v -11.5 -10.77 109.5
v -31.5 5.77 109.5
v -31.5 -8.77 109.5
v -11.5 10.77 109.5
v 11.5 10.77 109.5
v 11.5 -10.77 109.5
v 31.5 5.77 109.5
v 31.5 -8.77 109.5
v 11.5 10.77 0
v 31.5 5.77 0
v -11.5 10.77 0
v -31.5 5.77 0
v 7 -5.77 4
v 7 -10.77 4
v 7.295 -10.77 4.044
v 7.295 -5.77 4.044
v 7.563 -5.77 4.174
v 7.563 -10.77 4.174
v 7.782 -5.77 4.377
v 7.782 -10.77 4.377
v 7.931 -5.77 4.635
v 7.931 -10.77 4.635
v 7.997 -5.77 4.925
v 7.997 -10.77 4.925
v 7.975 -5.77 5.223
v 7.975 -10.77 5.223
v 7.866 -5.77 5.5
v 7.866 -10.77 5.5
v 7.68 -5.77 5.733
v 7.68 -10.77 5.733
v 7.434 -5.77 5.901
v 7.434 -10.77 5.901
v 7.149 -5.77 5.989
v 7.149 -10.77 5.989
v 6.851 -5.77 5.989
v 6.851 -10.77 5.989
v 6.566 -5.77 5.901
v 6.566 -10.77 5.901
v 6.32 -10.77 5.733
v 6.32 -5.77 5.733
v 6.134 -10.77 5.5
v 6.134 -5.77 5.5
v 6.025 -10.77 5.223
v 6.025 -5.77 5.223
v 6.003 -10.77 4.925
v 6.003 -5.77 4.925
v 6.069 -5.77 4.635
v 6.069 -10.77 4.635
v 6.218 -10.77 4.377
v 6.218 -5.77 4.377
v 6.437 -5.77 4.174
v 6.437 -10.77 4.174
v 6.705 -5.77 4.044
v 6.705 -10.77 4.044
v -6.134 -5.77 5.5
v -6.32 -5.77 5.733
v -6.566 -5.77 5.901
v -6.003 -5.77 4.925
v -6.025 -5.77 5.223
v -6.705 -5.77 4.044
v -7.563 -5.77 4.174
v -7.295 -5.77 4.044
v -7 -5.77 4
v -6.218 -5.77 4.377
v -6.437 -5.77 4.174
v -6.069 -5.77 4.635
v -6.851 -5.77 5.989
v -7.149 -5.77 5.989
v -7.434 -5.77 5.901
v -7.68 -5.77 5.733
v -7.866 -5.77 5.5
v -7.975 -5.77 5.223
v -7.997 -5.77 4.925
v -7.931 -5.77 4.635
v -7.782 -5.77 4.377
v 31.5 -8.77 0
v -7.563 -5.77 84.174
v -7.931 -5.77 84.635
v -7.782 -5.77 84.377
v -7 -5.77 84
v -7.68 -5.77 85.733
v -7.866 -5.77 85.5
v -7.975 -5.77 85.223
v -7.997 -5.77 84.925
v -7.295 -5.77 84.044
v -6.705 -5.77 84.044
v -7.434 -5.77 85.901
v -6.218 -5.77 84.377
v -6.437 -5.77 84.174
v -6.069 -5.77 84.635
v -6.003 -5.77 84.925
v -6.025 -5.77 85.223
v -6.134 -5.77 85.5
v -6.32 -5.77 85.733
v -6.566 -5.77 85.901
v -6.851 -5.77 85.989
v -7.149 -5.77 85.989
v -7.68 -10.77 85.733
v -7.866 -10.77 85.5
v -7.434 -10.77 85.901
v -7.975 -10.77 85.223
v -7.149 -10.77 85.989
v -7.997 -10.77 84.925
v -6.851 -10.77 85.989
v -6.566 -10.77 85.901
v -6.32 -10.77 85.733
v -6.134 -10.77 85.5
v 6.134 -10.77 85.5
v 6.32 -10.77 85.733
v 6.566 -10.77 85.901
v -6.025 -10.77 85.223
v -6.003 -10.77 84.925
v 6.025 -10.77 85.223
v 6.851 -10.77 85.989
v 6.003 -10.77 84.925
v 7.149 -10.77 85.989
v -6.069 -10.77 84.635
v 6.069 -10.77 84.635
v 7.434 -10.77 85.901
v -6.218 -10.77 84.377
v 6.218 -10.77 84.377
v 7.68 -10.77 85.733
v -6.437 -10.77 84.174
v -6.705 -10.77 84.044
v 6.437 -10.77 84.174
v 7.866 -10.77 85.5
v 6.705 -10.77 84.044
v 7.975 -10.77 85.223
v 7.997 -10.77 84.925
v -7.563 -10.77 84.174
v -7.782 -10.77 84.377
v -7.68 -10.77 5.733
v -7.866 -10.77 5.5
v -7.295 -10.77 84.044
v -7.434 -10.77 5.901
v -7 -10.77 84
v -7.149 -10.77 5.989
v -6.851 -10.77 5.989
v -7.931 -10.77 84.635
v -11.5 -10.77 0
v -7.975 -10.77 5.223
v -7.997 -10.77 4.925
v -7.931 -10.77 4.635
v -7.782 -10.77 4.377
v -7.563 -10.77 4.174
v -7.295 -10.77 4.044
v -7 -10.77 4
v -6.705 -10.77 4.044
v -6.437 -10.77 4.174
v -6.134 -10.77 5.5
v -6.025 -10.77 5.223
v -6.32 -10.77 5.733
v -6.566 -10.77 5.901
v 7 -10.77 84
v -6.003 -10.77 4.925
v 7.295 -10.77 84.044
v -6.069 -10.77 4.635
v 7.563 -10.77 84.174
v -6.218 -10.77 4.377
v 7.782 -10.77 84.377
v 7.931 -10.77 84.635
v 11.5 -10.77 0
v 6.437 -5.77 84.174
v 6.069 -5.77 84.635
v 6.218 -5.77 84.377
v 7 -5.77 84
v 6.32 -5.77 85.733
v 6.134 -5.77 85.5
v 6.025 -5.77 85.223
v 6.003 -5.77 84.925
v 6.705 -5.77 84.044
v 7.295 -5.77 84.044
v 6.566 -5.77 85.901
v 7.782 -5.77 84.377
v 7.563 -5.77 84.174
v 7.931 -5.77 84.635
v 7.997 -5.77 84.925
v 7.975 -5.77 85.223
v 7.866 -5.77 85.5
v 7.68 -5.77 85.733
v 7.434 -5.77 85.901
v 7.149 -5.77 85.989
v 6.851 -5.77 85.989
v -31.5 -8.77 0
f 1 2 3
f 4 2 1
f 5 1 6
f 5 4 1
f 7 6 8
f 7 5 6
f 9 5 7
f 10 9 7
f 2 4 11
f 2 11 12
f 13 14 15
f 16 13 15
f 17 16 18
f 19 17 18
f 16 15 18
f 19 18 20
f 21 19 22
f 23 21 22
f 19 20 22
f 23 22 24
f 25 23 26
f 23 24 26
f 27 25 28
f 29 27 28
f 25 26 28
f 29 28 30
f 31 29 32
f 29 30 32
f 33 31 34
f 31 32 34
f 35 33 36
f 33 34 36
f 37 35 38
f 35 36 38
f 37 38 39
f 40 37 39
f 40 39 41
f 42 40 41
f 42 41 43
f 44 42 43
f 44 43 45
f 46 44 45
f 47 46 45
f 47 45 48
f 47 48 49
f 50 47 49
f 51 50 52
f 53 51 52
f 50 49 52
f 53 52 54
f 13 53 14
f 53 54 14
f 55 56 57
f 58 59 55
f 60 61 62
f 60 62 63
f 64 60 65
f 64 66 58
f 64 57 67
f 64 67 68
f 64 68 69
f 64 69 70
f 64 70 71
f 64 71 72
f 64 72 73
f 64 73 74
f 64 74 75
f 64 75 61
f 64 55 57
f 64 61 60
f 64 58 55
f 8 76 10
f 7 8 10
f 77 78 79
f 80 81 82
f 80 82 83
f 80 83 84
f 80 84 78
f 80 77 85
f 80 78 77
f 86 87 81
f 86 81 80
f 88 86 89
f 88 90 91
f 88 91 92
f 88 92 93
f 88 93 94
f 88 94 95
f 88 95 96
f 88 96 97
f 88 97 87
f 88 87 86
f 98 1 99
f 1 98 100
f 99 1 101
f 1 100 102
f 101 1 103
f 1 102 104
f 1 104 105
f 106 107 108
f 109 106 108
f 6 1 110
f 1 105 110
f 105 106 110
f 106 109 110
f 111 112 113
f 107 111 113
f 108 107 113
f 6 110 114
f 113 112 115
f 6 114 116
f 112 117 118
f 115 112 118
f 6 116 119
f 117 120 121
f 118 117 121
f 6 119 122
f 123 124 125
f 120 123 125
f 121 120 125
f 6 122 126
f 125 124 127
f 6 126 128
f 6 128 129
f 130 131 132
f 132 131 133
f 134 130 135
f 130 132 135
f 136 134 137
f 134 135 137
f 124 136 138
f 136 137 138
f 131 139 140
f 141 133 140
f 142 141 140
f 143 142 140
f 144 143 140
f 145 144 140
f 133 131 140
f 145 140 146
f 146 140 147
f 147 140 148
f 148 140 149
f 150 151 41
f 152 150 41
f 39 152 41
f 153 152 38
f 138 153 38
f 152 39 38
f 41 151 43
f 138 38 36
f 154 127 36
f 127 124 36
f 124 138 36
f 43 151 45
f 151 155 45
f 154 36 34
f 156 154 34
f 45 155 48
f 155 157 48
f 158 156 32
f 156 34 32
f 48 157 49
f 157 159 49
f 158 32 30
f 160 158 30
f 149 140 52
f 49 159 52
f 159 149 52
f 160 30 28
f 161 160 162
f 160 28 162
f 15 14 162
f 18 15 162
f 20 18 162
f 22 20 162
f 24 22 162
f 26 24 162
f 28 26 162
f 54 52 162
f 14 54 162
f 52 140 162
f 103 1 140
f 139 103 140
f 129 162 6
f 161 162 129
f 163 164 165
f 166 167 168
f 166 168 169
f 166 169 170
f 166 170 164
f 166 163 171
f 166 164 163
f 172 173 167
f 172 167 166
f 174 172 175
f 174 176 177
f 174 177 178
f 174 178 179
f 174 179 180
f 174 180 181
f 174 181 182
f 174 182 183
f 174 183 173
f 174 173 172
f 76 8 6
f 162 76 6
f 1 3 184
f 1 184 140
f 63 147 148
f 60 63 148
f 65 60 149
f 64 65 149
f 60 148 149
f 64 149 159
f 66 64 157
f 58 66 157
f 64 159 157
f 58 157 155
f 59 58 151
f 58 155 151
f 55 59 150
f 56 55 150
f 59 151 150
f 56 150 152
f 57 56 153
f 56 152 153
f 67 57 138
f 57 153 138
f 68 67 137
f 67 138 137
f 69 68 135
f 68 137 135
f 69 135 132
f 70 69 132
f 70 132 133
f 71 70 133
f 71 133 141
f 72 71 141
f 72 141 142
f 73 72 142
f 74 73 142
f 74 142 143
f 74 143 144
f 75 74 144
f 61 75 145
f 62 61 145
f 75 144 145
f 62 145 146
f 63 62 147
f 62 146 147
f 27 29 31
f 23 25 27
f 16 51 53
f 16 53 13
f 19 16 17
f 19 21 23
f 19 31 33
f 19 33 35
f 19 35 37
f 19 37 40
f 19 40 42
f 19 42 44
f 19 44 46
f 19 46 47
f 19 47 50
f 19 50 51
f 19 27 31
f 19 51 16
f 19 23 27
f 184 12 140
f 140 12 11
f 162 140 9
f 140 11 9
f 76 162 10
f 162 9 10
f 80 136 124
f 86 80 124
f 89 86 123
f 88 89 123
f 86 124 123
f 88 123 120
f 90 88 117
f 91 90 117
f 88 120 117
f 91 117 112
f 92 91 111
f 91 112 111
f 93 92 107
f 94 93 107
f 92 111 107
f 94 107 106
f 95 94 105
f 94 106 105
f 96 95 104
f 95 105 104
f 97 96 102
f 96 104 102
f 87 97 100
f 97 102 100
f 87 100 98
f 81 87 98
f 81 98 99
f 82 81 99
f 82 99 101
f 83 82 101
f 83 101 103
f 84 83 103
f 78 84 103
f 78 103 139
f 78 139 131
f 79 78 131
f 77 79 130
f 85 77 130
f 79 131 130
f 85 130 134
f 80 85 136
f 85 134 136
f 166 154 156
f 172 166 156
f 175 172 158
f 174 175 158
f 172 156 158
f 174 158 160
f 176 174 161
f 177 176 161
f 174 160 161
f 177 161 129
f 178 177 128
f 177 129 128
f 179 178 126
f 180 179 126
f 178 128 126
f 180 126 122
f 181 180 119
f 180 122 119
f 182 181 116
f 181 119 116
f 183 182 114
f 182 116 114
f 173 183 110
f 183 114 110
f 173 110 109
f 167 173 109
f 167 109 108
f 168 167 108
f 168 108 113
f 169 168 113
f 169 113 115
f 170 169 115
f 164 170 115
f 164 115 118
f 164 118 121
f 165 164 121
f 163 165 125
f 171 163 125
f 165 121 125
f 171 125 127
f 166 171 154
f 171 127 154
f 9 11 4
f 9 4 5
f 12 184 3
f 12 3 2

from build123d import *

# Parameters (mm, degrees)
SKETCH_1_W          = 63
SKETCH_1_H          = 21.54
EXTRUDE_1_DEPTH     = 109.5
CUT_EXTRUDE_1_DEPTH = 115.448647436
SKETCH_3_R          = 1
CUT_EXTRUDE_2_DEPTH = 5


with BuildPart() as part:
    # 草图1 → 凸台-拉伸1 (new body)
    with BuildSketch(Plane.XY):
        Rectangle(SKETCH_1_W, SKETCH_1_H)
    extrude(amount=EXTRUDE_1_DEPTH)

    # 草图2 → 切除-拉伸1 (cut, through all)
    with BuildSketch(Plane.XY.offset(109.5)):
        Polygon((11.5, 10.77), (31.5, 5.77), (31.5, 10.77), align=None)
        Polygon((-31.5, 10.77), (-11.5, 10.77), (-31.5, 5.77), align=None)
        Polygon((-31.5, -8.77), (-11.5, -10.77), (-31.5, -10.77), align=None)
        Polygon((31.5, -8.77), (11.5, -10.77), (31.5, -10.77), align=None)
    extrude(amount=-CUT_EXTRUDE_1_DEPTH, mode=Mode.SUBTRACT)

    # 草图3 → 切除-拉伸2 (cut)
    with BuildSketch(Plane.XZ.offset(10.77)):
        with Locations(Location((-7, 5, 0), (0, 0, 270))):
            Circle(SKETCH_3_R)
        with Locations(Location((7, 5, 0), (0, 0, 270))):
            Circle(SKETCH_3_R)
        with Locations(Location((-7, 85, 0), (0, 0, 270))):
            Circle(SKETCH_3_R)
        with Locations(Location((7, 85, 0), (0, 0, 270))):
            Circle(SKETCH_3_R)
    extrude(amount=-CUT_EXTRUDE_2_DEPTH, mode=Mode.SUBTRACT)


solid = part.part
